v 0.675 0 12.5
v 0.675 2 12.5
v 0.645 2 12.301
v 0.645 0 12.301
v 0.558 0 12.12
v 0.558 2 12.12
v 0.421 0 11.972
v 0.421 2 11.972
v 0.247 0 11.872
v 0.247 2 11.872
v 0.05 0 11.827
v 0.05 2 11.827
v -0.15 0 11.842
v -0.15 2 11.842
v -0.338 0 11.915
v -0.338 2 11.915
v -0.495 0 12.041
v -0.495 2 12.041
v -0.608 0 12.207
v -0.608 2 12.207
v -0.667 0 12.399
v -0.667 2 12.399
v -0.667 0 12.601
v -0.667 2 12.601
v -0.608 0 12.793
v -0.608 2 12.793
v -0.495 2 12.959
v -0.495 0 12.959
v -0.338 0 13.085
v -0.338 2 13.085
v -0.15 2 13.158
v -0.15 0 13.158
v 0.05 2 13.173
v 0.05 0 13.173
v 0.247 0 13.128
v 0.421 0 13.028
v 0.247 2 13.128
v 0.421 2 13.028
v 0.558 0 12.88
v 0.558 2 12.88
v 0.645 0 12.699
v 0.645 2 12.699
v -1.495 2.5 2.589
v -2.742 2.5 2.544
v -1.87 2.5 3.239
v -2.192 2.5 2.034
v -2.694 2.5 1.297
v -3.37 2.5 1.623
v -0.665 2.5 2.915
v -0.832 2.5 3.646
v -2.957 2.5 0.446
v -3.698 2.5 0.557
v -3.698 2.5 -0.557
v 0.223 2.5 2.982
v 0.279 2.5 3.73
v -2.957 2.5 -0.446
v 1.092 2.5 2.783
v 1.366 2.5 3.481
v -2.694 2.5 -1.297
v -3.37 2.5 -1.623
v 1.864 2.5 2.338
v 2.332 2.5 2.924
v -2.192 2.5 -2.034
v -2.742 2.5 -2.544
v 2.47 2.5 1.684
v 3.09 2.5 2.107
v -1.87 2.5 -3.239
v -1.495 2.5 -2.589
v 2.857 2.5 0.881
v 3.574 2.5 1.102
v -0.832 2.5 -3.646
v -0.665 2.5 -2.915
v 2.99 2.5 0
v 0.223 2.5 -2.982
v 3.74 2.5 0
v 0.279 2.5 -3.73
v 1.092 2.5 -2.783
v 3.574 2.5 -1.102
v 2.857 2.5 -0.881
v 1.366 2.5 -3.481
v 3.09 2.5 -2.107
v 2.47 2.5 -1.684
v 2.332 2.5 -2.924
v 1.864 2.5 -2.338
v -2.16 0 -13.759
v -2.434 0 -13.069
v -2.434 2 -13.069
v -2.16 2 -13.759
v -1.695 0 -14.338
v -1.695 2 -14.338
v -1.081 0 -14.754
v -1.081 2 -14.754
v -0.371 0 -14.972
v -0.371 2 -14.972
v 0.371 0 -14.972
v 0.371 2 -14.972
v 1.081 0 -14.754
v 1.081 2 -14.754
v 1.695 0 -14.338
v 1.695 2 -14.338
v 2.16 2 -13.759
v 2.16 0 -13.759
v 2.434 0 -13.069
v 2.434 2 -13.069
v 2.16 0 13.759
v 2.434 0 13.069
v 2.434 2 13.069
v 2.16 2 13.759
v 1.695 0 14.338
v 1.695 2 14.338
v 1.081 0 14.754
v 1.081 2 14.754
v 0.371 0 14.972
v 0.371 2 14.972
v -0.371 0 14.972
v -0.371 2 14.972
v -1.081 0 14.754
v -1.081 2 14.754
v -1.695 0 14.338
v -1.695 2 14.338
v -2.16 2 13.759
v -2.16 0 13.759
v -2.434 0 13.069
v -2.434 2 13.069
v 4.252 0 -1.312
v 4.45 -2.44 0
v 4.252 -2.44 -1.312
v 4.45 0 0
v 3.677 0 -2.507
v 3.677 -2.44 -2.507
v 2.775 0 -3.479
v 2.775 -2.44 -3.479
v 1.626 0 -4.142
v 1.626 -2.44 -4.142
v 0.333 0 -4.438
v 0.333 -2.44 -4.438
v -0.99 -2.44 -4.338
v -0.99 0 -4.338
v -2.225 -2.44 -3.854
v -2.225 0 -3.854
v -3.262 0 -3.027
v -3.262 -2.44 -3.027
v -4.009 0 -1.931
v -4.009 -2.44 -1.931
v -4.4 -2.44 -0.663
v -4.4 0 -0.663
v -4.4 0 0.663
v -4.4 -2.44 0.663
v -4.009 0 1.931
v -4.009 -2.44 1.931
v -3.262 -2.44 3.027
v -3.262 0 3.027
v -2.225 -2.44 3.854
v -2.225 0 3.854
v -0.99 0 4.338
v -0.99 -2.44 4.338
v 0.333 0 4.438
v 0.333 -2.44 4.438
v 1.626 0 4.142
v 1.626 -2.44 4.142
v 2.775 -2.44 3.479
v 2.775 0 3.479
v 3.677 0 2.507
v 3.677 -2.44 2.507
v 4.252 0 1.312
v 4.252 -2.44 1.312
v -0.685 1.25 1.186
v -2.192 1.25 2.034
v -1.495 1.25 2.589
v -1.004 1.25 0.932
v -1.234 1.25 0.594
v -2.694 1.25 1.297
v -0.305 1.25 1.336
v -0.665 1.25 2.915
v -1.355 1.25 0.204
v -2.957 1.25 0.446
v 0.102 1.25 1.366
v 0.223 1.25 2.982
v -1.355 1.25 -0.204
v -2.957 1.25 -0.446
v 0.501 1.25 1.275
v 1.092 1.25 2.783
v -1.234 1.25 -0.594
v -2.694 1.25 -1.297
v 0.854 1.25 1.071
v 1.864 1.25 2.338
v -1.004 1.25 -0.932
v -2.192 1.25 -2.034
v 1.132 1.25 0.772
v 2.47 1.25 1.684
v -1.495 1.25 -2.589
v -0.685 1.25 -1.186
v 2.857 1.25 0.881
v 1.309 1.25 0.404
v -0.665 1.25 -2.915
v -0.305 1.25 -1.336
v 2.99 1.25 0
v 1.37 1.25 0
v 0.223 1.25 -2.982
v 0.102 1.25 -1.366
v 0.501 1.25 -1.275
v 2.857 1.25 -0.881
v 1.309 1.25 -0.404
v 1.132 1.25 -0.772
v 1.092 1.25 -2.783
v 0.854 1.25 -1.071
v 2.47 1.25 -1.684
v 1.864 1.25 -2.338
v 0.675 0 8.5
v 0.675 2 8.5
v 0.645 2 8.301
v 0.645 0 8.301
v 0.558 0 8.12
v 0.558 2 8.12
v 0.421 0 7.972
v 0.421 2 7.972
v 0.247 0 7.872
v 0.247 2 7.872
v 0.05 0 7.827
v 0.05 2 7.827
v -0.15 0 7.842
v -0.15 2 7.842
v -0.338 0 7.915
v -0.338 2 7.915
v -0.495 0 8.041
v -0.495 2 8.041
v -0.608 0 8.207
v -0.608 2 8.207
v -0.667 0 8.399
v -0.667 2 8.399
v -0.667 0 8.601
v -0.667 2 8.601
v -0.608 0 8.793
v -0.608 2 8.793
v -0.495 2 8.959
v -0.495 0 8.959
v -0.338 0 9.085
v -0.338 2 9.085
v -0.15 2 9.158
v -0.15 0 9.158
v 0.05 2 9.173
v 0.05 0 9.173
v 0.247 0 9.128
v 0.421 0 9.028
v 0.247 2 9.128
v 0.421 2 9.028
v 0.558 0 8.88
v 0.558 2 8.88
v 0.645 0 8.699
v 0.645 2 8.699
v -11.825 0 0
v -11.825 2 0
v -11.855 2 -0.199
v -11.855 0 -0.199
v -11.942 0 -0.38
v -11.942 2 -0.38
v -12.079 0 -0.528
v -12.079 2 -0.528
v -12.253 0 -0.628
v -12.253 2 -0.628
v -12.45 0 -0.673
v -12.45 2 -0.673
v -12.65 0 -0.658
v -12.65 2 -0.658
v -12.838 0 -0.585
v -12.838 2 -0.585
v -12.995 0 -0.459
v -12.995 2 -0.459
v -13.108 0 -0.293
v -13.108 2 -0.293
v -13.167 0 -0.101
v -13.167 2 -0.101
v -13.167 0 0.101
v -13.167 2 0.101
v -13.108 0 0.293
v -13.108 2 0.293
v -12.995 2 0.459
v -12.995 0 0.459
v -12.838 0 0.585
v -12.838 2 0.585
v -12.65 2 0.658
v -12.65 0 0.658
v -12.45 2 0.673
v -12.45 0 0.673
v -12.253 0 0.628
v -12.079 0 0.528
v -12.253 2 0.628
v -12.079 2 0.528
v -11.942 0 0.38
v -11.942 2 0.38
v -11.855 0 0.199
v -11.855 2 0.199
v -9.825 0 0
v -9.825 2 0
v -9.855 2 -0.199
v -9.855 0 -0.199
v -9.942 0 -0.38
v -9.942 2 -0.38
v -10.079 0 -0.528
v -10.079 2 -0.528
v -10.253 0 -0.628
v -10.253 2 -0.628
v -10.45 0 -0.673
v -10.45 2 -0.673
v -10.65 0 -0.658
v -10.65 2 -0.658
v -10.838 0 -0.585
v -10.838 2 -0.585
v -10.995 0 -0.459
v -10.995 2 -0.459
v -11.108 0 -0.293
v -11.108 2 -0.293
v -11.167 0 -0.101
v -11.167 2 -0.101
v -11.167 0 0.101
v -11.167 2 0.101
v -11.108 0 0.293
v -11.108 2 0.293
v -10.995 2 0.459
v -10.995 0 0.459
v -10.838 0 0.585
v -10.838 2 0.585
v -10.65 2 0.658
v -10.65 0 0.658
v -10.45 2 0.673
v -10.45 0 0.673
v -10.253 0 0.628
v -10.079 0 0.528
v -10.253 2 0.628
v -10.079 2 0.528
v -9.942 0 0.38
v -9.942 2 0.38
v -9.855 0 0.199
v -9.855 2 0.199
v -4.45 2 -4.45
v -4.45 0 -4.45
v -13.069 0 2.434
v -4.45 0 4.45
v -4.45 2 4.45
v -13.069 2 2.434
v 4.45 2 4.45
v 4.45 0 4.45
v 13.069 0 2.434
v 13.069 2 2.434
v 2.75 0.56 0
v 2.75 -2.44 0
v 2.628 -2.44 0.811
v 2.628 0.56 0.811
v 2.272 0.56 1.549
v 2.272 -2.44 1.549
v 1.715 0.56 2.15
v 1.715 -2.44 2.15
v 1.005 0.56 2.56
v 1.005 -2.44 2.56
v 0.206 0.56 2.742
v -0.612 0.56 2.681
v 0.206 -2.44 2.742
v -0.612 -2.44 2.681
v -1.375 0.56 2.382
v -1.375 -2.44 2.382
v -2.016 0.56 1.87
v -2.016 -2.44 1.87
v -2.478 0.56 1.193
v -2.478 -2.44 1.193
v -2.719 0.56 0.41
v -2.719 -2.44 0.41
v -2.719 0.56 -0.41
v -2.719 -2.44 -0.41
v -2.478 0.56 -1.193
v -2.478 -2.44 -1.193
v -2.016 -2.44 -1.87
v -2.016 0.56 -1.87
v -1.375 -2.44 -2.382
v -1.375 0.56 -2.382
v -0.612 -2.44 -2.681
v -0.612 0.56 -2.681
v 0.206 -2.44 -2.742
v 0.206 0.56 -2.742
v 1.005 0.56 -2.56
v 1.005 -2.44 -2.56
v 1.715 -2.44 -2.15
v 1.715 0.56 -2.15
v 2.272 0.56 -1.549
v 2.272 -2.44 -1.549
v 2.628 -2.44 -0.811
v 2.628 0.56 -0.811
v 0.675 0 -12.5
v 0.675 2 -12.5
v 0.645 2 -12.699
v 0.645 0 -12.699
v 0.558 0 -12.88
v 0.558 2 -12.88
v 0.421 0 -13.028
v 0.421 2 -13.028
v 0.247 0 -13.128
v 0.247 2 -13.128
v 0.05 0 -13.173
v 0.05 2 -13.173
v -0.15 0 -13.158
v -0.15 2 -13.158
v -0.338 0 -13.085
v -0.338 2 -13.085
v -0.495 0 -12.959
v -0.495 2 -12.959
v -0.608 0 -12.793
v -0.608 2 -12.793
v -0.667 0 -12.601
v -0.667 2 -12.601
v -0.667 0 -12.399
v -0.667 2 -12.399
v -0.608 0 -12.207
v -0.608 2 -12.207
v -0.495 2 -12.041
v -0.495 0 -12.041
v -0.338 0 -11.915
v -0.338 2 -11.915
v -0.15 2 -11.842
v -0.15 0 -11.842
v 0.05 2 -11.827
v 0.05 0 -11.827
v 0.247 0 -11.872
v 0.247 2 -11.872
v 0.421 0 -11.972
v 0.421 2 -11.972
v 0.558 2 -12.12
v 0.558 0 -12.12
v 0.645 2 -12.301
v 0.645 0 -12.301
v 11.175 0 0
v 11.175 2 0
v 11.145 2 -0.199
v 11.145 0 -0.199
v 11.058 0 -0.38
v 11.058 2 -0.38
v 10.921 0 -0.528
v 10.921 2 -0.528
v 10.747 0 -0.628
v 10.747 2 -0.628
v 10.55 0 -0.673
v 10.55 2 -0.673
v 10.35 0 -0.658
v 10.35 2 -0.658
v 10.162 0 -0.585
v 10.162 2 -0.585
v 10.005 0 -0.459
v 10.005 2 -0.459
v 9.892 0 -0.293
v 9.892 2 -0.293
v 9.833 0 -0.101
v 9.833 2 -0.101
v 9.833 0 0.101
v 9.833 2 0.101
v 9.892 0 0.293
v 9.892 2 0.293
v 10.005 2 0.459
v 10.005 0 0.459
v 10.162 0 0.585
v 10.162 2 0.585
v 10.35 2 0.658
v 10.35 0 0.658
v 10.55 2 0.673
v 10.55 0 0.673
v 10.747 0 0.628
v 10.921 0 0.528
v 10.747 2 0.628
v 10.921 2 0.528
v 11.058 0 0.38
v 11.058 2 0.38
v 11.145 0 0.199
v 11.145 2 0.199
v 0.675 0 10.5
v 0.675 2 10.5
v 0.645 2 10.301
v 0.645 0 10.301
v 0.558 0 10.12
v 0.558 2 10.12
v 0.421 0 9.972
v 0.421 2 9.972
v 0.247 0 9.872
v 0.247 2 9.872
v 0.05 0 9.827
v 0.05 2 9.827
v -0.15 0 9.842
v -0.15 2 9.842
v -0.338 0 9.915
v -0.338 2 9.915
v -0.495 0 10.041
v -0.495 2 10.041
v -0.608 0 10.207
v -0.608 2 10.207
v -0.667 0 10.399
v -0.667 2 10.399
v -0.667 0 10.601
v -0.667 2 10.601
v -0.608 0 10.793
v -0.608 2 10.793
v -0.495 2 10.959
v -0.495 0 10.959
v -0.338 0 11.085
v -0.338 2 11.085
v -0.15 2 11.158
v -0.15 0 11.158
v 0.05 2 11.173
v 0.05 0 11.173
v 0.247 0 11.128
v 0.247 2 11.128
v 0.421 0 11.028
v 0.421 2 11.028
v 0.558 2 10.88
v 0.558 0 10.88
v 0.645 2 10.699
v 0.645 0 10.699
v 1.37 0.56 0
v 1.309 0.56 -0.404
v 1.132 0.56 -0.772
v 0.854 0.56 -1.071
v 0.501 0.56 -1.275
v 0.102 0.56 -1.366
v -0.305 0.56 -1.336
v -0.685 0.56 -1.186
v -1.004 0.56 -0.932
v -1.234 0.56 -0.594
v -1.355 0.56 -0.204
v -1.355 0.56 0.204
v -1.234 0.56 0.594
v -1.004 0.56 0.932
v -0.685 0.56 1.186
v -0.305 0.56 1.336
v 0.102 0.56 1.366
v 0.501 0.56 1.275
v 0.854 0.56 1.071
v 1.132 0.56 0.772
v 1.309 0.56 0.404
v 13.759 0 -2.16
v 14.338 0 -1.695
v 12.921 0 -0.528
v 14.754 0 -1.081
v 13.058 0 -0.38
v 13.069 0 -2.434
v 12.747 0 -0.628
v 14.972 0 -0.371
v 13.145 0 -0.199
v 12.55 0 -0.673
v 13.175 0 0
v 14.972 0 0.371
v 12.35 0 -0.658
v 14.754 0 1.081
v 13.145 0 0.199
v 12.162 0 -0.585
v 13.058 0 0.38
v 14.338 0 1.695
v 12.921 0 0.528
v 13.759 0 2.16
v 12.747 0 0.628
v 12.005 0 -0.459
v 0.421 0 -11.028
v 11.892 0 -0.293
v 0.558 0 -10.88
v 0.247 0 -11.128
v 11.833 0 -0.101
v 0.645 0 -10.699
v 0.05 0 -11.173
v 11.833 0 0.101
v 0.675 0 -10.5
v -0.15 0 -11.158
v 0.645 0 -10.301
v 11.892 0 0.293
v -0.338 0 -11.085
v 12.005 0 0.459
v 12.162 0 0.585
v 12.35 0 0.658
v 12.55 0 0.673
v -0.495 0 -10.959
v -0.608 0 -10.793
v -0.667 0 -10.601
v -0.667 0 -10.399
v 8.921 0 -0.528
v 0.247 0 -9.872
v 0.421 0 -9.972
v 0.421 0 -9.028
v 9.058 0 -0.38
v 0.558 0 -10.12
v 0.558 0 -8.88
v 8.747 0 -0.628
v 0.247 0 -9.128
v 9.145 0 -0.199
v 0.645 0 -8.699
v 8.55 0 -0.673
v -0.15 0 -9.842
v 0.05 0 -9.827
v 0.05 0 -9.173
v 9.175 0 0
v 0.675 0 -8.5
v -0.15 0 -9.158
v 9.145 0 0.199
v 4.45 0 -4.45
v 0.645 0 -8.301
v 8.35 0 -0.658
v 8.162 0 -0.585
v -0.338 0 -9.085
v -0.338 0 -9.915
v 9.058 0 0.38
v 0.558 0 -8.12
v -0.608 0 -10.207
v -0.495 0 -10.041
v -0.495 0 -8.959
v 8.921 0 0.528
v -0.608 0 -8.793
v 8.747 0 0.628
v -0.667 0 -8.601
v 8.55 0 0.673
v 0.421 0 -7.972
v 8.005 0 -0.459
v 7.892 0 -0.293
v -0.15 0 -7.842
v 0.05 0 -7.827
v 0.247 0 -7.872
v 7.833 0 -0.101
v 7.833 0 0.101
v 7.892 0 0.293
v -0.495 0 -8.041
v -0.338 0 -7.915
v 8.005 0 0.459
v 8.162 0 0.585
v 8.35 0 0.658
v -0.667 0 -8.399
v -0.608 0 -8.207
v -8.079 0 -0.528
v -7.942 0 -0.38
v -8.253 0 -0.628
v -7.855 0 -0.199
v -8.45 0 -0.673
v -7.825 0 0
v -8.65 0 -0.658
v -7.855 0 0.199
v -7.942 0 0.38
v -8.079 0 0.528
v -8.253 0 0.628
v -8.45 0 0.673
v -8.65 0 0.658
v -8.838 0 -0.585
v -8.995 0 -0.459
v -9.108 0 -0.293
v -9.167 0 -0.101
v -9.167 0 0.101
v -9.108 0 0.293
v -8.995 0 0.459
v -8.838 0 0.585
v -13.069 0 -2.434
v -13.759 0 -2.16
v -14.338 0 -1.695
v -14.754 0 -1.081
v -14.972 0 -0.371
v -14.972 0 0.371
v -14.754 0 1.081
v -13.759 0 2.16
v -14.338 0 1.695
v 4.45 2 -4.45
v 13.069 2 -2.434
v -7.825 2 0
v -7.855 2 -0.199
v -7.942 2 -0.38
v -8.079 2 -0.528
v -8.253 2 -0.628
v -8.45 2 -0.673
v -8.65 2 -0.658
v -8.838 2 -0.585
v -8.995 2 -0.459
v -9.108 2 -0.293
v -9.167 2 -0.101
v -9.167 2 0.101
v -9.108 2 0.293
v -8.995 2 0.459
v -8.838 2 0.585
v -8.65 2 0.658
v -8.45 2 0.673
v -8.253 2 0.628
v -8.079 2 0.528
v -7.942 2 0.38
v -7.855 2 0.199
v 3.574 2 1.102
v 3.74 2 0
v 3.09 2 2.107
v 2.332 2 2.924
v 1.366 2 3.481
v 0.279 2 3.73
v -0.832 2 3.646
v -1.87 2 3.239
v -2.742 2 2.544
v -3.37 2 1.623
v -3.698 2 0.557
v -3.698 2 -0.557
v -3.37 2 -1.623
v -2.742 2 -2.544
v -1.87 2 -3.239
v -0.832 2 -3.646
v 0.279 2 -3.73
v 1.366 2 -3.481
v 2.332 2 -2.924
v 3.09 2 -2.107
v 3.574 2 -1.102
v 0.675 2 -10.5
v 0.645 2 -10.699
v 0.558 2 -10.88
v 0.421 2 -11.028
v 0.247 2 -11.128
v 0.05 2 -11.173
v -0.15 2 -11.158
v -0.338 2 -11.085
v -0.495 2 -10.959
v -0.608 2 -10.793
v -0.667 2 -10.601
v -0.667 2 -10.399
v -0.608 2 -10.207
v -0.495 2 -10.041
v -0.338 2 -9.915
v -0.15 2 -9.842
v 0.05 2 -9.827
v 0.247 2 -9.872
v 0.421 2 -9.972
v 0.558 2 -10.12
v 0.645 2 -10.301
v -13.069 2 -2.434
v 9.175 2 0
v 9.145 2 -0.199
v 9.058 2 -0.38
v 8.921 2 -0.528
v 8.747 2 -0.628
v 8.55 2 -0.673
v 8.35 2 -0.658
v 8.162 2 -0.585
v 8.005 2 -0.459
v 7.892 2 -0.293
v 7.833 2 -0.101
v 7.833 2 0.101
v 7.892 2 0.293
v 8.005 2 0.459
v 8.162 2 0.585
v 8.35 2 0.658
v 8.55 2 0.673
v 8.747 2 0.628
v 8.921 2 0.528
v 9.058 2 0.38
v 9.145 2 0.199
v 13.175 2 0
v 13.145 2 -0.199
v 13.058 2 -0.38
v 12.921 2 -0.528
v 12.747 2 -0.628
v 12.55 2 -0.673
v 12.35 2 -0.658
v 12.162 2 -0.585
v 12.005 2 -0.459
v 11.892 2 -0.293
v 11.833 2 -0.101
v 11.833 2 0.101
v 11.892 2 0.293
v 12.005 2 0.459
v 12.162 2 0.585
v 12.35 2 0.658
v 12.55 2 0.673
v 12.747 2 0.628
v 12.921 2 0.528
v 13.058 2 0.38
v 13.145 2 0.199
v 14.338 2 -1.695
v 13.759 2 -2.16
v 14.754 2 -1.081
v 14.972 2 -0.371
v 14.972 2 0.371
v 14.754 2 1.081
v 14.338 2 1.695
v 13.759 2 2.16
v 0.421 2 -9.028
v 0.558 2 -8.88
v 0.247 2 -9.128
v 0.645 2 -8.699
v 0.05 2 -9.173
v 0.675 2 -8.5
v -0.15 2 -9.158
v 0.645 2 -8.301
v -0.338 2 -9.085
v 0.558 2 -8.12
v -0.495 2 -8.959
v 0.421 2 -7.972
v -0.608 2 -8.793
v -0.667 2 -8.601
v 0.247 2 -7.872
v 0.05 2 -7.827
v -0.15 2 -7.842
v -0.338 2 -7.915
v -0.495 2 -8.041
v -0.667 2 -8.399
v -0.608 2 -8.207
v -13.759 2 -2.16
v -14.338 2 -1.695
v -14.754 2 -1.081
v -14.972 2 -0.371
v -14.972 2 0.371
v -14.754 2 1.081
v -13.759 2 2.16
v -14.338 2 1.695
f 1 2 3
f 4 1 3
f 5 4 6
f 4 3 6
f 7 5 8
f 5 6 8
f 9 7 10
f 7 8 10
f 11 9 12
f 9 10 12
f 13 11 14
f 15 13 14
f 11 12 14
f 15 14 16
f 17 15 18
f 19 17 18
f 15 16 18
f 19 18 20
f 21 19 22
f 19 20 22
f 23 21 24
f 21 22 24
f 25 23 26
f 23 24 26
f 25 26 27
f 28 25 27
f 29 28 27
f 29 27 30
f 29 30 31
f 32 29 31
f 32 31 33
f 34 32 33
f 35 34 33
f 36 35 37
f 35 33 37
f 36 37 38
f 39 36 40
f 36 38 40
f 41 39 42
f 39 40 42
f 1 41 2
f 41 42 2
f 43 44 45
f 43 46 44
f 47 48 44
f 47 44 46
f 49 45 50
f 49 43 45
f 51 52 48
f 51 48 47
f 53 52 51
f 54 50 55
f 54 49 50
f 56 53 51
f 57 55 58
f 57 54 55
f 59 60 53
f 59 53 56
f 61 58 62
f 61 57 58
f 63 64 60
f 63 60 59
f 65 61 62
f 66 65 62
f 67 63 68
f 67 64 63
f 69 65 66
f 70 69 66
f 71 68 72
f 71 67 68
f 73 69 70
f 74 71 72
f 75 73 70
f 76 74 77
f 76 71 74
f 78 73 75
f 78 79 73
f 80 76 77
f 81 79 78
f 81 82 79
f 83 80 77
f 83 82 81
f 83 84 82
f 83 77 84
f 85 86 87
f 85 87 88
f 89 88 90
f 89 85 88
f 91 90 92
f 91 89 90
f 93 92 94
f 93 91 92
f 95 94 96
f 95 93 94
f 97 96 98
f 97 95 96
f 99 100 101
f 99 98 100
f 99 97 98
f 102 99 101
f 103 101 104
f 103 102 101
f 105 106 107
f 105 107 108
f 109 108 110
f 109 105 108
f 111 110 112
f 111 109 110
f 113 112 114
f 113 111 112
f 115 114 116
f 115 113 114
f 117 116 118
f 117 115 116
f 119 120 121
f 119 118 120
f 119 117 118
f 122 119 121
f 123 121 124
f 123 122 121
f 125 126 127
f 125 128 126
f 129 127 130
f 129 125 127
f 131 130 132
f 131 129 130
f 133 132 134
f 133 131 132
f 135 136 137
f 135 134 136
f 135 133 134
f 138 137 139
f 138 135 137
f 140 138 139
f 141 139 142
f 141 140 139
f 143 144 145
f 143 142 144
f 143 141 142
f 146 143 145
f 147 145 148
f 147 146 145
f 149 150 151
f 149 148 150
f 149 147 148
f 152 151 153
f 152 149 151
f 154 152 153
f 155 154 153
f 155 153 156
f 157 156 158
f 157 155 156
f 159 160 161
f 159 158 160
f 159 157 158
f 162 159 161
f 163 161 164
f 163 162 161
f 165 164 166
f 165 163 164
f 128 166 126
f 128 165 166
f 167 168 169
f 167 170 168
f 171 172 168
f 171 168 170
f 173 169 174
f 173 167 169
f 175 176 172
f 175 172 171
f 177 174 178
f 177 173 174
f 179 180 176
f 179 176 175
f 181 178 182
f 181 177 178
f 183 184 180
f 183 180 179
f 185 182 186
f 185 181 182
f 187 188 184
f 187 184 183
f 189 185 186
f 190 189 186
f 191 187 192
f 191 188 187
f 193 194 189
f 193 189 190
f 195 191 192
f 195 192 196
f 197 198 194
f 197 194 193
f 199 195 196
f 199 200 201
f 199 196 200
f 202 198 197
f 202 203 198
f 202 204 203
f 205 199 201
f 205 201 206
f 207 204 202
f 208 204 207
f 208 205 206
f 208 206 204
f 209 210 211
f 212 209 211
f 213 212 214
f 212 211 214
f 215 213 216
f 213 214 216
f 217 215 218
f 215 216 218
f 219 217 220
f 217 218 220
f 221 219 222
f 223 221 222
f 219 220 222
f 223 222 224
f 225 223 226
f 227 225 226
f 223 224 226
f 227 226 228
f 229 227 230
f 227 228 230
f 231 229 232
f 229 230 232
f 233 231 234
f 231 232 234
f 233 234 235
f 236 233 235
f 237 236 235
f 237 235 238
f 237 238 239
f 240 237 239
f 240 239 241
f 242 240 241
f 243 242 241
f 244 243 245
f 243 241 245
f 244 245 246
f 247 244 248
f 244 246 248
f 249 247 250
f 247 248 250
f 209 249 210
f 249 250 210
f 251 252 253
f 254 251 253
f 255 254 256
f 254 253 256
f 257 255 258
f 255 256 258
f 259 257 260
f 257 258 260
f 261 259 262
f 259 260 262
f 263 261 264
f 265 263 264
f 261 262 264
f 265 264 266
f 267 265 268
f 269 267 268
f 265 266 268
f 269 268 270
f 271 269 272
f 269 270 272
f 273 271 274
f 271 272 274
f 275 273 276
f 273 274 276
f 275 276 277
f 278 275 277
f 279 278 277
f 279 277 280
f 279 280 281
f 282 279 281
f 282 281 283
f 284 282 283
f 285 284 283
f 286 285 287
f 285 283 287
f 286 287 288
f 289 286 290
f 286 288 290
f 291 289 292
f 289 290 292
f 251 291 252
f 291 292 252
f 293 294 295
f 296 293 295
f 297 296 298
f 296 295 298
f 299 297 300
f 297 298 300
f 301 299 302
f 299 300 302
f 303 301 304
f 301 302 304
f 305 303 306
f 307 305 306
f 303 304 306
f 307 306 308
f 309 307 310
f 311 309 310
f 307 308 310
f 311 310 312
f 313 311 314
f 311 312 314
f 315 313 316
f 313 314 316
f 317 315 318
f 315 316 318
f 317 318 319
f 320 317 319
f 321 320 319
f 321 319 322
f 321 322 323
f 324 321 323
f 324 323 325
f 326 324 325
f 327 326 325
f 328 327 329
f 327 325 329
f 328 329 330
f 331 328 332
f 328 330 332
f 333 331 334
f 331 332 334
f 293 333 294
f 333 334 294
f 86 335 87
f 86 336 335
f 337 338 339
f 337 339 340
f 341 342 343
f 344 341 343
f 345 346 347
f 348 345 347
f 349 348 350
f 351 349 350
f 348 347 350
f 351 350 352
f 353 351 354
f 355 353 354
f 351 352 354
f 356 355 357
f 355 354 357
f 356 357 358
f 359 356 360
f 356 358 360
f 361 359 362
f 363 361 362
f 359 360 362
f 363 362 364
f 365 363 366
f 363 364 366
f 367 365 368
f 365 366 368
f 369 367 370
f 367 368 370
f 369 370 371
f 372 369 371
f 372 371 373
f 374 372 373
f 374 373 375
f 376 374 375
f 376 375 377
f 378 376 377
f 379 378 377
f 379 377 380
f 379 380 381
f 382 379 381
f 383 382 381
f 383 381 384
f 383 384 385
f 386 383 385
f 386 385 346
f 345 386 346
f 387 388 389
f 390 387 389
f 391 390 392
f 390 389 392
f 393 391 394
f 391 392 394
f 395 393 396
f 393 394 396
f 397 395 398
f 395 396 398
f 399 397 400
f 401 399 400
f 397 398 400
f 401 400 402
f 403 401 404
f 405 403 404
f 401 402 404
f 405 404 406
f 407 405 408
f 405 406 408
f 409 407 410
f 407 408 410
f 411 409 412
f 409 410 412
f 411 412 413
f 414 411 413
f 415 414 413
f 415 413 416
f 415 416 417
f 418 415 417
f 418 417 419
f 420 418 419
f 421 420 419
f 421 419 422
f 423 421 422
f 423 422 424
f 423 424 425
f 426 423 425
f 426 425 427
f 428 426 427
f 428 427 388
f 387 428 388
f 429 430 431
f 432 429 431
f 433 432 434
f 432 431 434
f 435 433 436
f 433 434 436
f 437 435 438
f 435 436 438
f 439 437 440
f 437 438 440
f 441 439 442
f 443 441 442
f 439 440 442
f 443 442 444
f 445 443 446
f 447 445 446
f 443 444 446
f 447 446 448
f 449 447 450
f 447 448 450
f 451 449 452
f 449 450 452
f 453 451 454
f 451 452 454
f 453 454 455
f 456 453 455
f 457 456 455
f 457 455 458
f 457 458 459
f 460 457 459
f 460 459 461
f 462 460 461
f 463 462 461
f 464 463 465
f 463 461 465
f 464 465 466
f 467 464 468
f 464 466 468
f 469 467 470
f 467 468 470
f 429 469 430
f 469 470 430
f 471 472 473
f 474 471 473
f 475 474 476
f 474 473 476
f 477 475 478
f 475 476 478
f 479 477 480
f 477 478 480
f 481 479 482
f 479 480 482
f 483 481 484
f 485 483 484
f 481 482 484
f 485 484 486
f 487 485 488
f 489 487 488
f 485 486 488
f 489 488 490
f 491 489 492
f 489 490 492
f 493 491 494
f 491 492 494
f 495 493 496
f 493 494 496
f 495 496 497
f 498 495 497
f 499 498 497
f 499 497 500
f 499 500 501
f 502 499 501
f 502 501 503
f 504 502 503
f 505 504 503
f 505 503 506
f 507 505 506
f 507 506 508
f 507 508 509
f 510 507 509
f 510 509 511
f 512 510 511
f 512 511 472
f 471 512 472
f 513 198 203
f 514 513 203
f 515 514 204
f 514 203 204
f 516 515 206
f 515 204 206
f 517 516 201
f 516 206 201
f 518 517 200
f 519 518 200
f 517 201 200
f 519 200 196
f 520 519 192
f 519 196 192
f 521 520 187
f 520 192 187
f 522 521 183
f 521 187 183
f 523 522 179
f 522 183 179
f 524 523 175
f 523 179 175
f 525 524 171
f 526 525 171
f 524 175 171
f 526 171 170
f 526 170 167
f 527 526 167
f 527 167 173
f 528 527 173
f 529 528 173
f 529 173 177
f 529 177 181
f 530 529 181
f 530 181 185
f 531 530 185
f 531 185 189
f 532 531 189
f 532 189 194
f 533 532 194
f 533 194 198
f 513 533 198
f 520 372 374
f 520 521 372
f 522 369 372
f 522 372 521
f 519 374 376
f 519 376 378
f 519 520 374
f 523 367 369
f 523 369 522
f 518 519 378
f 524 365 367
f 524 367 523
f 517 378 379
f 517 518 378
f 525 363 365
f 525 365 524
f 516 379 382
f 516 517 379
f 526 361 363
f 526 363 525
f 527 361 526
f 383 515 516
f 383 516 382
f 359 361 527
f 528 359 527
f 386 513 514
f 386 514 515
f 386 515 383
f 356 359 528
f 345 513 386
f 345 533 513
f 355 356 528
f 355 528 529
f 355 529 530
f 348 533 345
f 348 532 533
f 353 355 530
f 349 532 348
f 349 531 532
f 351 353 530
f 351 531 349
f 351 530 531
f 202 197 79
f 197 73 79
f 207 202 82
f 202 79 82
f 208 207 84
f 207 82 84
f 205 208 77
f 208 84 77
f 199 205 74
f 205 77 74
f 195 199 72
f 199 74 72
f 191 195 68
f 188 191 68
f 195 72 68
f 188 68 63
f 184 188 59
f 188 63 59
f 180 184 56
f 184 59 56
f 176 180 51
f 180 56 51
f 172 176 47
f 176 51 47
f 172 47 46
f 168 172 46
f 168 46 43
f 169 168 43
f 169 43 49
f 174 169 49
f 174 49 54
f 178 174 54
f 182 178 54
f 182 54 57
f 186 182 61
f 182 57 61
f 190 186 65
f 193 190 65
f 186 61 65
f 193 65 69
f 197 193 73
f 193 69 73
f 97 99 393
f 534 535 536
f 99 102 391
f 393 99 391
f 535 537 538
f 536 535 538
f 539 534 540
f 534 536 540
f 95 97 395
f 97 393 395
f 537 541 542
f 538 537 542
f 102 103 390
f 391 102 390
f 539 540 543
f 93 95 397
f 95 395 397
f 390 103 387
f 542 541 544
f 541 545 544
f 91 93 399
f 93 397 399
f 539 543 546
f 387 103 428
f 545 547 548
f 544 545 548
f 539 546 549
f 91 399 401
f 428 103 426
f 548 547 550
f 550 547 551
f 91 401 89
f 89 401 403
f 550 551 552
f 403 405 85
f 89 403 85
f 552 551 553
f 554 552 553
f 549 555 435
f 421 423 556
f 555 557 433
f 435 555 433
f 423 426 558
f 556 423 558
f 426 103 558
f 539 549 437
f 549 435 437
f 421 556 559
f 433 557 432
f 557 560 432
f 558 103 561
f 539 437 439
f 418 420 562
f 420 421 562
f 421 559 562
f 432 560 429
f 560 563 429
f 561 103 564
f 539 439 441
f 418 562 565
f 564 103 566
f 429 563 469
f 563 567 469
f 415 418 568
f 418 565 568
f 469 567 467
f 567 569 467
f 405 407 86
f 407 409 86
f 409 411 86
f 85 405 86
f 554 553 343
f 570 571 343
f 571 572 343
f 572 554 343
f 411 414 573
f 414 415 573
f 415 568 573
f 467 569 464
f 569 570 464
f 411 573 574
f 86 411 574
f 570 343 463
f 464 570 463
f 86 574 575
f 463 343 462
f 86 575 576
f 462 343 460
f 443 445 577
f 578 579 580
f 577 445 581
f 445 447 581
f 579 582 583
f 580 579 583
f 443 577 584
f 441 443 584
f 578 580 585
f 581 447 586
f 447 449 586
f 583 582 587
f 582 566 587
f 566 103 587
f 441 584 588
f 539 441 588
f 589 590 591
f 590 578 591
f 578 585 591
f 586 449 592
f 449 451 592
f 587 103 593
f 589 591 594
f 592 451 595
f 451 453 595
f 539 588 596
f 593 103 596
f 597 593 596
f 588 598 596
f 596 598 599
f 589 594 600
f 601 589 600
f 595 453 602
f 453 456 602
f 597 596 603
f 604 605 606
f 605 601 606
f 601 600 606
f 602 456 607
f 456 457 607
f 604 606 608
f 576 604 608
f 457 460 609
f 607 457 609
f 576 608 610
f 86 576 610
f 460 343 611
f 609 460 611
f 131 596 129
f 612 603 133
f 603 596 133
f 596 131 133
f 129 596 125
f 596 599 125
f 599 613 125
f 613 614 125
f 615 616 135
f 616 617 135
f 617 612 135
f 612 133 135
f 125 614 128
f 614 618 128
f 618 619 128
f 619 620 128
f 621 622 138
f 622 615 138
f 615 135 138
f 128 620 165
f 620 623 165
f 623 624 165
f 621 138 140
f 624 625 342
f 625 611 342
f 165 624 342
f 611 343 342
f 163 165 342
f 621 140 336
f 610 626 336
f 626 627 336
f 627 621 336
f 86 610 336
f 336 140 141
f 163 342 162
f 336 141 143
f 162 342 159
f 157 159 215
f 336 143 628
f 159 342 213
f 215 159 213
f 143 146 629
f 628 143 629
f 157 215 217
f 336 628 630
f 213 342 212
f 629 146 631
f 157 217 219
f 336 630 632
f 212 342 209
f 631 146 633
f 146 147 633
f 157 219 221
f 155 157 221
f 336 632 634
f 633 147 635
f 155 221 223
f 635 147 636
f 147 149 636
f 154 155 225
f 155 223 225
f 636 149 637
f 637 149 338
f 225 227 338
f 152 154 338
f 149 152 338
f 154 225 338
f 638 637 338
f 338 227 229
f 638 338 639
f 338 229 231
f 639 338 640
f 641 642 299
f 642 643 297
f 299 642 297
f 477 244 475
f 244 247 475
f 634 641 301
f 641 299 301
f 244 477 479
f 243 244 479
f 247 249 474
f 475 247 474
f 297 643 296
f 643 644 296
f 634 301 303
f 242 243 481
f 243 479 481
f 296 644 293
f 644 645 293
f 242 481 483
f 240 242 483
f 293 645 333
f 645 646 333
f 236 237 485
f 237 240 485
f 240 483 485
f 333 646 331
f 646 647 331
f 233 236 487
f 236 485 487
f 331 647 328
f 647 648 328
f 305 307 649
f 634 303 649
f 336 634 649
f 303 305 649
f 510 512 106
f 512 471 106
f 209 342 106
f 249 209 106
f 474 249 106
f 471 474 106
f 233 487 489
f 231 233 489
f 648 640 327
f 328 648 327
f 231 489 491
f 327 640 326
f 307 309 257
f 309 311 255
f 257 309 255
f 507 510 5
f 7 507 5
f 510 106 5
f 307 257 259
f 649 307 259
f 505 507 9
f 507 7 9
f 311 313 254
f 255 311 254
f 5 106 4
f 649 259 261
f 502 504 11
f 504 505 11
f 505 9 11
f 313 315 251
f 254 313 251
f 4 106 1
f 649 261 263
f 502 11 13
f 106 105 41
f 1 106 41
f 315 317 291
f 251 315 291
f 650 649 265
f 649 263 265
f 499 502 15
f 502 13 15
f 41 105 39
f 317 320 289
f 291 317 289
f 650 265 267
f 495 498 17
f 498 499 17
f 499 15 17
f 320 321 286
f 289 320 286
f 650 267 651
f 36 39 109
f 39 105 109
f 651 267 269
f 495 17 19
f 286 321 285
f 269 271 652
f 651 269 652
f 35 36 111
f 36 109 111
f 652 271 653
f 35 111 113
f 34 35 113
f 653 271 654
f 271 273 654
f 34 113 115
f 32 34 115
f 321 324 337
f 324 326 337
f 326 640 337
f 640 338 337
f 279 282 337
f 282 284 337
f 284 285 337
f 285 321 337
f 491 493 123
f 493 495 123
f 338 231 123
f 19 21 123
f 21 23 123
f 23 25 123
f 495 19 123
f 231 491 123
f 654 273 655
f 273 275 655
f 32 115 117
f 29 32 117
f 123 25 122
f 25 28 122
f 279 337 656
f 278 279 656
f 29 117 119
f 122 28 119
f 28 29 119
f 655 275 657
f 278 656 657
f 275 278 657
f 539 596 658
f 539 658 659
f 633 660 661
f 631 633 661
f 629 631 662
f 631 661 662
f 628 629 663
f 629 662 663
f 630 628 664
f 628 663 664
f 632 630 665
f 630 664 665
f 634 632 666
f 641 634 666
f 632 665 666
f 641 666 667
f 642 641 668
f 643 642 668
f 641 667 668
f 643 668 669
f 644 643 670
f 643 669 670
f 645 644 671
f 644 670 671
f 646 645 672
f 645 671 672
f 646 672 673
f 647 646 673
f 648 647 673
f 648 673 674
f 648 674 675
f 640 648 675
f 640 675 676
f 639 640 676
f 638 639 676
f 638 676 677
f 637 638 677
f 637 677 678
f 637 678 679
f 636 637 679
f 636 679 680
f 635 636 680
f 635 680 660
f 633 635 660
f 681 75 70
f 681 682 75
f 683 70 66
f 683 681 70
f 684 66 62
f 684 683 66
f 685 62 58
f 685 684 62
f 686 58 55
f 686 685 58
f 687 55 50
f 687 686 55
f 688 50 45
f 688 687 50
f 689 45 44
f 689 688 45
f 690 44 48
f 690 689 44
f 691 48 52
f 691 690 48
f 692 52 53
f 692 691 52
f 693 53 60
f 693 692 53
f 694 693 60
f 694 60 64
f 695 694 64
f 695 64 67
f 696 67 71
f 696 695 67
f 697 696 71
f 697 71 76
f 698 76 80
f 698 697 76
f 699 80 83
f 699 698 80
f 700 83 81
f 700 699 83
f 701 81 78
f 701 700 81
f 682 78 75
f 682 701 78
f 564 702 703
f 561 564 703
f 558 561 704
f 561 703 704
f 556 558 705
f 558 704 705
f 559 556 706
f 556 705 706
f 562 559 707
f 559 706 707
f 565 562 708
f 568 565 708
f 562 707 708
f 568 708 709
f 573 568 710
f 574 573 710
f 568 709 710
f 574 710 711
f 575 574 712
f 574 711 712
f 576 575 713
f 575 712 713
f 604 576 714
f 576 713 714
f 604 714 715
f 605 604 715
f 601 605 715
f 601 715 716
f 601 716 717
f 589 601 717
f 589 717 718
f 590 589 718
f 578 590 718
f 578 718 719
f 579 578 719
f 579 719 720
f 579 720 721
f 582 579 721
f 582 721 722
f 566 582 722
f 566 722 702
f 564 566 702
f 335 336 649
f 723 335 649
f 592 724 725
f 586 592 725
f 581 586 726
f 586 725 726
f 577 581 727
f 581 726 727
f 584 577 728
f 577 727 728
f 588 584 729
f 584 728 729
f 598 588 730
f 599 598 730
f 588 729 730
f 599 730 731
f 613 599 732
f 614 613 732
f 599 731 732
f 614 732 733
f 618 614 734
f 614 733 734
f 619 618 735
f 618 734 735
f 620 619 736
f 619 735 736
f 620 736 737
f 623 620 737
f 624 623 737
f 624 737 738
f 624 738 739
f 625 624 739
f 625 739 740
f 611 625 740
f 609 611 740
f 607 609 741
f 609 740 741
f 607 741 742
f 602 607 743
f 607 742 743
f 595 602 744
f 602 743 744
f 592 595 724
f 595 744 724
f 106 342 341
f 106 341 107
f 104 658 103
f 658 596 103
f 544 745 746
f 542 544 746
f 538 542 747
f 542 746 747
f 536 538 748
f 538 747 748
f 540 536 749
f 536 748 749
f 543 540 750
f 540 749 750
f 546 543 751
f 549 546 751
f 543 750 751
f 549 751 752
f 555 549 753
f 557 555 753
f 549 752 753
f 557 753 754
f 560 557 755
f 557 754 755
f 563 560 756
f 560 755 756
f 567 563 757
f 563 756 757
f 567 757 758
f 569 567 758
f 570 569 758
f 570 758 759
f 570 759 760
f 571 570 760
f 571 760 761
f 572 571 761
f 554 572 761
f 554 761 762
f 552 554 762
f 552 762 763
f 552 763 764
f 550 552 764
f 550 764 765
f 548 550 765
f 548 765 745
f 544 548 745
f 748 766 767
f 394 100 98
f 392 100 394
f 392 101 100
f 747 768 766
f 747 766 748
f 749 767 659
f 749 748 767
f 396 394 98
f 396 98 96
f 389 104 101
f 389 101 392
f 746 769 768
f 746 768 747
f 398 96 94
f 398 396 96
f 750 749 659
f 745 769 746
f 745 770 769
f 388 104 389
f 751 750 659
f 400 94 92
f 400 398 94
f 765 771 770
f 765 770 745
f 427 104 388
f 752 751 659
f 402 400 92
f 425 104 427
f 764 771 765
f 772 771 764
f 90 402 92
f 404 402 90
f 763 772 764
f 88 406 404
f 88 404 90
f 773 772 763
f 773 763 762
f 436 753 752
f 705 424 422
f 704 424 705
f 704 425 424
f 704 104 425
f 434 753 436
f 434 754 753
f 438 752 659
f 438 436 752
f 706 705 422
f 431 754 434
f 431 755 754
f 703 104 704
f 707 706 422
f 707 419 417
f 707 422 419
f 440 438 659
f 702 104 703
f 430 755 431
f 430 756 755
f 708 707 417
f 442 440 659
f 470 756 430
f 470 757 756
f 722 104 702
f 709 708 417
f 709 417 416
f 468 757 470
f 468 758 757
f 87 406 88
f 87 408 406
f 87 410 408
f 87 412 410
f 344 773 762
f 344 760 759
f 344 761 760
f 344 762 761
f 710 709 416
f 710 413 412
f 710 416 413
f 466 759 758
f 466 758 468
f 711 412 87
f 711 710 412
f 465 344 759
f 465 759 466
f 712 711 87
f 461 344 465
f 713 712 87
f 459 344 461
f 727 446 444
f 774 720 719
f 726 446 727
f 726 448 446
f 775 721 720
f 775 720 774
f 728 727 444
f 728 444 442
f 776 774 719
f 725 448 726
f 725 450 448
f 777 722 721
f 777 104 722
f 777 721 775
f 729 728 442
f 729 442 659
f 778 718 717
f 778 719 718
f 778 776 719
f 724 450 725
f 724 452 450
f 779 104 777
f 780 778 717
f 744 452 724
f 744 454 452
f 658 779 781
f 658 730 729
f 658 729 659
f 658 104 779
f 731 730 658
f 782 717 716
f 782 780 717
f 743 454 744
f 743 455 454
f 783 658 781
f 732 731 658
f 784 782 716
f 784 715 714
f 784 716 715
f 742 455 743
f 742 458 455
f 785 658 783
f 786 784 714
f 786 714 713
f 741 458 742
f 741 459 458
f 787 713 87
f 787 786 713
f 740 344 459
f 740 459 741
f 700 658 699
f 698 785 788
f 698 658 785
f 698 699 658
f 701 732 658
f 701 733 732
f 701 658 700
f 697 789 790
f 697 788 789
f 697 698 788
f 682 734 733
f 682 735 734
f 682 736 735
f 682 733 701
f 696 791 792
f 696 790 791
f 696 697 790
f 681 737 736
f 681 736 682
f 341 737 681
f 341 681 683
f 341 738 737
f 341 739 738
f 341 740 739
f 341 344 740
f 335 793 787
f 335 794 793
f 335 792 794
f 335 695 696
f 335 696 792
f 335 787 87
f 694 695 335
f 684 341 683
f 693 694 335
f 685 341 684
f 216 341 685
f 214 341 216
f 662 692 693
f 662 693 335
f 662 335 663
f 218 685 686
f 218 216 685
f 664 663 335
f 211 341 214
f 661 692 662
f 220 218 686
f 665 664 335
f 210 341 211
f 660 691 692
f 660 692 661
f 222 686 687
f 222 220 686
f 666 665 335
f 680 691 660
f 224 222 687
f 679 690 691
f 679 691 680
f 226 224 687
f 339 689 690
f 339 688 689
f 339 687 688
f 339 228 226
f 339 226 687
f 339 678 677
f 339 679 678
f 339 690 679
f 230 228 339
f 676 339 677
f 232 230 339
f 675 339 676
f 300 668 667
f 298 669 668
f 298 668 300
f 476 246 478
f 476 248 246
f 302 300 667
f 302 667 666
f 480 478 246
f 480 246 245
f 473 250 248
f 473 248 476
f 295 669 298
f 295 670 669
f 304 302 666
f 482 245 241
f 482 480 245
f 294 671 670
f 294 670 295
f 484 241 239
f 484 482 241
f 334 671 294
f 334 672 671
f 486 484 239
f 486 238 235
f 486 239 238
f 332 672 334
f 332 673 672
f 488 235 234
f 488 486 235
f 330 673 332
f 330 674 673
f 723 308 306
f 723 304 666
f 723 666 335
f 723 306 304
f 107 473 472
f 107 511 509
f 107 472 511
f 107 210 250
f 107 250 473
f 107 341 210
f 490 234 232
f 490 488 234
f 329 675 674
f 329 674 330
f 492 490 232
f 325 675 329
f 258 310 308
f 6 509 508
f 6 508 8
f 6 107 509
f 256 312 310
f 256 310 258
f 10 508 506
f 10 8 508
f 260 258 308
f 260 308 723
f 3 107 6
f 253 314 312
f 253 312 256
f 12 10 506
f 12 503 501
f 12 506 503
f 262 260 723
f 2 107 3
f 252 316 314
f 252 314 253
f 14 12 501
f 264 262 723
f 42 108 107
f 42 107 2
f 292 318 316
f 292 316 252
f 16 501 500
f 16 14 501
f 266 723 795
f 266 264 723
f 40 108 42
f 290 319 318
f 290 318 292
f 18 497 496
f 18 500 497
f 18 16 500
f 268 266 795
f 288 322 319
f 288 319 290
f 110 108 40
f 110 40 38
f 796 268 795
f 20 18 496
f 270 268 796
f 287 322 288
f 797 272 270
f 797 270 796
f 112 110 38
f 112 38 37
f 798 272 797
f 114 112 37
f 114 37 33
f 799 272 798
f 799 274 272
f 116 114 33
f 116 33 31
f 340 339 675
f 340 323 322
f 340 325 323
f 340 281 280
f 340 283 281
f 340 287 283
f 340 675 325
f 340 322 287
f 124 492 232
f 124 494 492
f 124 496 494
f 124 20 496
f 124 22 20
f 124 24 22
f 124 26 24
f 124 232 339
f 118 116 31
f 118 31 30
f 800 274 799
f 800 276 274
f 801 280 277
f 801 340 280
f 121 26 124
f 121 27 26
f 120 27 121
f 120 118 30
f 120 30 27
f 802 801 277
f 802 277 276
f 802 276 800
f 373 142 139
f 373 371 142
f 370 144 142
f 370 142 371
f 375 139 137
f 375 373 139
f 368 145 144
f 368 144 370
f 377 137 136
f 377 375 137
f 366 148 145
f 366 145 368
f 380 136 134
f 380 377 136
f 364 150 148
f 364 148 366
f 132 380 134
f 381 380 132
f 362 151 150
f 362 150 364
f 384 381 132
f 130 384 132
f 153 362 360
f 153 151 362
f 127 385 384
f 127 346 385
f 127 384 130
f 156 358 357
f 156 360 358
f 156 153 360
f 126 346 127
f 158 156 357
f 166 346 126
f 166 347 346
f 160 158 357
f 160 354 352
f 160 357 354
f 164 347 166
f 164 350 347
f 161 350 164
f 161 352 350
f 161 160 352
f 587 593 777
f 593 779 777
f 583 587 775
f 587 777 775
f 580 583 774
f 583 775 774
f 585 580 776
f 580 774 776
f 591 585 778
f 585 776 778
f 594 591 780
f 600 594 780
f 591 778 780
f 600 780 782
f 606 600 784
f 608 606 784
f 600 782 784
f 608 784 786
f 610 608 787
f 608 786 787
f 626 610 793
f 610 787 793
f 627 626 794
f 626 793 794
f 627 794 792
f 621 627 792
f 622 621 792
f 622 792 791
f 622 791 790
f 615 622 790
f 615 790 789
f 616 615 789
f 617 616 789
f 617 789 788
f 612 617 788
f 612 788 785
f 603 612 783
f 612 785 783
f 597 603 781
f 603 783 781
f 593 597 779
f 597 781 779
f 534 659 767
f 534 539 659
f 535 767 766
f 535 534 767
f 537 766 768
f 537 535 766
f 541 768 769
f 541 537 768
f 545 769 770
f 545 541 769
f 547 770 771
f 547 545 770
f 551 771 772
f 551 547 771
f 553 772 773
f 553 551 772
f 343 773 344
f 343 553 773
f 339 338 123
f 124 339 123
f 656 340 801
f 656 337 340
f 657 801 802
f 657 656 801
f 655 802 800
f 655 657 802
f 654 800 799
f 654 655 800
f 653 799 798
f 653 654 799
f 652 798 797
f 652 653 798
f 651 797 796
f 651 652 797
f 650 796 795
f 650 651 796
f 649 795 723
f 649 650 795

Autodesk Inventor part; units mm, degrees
ref_plane "YZ Plane" through (0, 0, 0) normal (1, 0, 0) x (0, 1, 0)
ref_plane "XZ Plane" through (0, 0, 0) normal (0, 1, 0) x (-1, 0, 0)
ref_plane "XY Plane" through (0, 0, 0) normal (0, 0, 1) x (1, 0, 0)
sketch "Sketch1" plane through (0, 0, 0) normal (0, 1, 0) x (-1, 0, 0)
  circle A0 centre (0, 0) radius 4.45
  circle A1 centre (12.5, 0) radius 2.5
  circle A2 centre (0, -12.5) radius 2.5
  line L0 (4.45, -4.45) -> (13.0693, -2.4343)
  line L1 (4.45, -4.45) -> (2.4343, -13.0693)
  circle A3 centre (12.5, 0) radius 2.5
  circle A4 centre (0, 12.5) radius 2.5
  line L2 (4.45, 4.45) -> (13.0693, 2.4343)
  line L3 (4.45, 4.45) -> (2.4343, 13.0693)
  circle A5 centre (-12.5, 0) radius 2.5
  line L4 (-4.45, -4.45) -> (-13.0693, -2.4343)
  line L5 (-4.45, -4.45) -> (-2.4343, -13.0693)
  line L6 (-4.45, 4.45) -> (-13.0693, 2.4343)
  line L7 (-4.45, 4.45) -> (-2.4343, 13.0693)
  dimension "d2" = 5
  dimension "d0" = 8.9
extrude "Extrusion1" add sketch "Sketch1" along normal blind 2 contours A0 | A1 | A1 L0 L1 A2 L5 L4 A5 L6 L7 A4 L3 L2 | A4 | A2 | A5
sketch "Sketch2" plane through (0, 2, 0) normal (0, 1, 0) x (1, 0, 0)
  circle A0 centre (0, 0) radius 3.74
  dimension "d8" = 7.48
extrude "Extrusion2" add sketch "Sketch2" along normal blind 0.5
sketch "Sketch3" plane through (0, 2.5, 0) normal (0, 1, 0) x (1, 0, 0)
  circle A0 centre (0, 0) radius 2.99
  dimension "d11" = 5.98
extrude "Extrusion3" cut sketch "Sketch3" against normal blind 1.25
sketch "Sketch4" plane through (0, 1.25, 0) normal (0, 1, 0) x (1, 0, 0)
  circle A0 centre (0, 0) radius 1.37
  dimension "d14" = 2.74
extrude "Extrusion4" cut sketch "Sketch4" against normal blind 0.69
sketch "Sketch5" plane through (0, 0, 0) normal (0, -1, 0) x (1, 0, 0)
  circle A0 centre (0, 0) radius 4.45
  dimension "d17" = 8.9
extrude "Extrusion5" add sketch "Sketch5" along normal blind 2.44
sketch "Sketch6" plane through (0, -2.44, 0) normal (0, -1, 0) x (1, 0, 0)
  circle A0 centre (0, 0) radius 2.75
  dimension "d20" = 5.5
extrude "Extrusion6" cut sketch "Sketch6" against normal blind 3
sketch "Sketch7" plane through (0, 2, 0) normal (0, 1, 0) x (1, 0, 0)
  circle A0 centre (0, 8.5) radius 0.675
  circle A1 centre (0, 10.5) radius 0.675
  arc A2 (2.4343, 13.0693) -> (-2.4343, 13.0693) centre (0, 12.5) ccw projected
  circle A3 centre (0, 12.5) radius 0.675
  arc A4 (-13.0693, 2.4343) -> (-13.0693, -2.4343) centre (-12.5, 0) ccw projected
  arc A5 (13.0693, -2.4343) -> (13.0693, 2.4343) centre (12.5, 0) ccw projected
  circle A6 centre (0, -8.5) radius 0.675
  circle A7 centre (0, -10.5) radius 0.675
  circle A8 centre (0, -12.5) radius 0.675
  circle A9 centre (0, 0) radius 3.74 projected
  circle A10 centre (8.5, 0) radius 0.675
  circle A11 centre (0, 0) radius 1.37 projected
  circle A12 centre (10.5, 0) radius 0.675
  circle A13 centre (12.5, 0) radius 0.675
  arc A14 (-2.4343, -13.0693) -> (2.4343, -13.0693) centre (0, -12.5) ccw projected
  circle A15 centre (-8.5, 0) radius 0.675
  circle A16 centre (-10.5, 0) radius 0.675
  circle A17 centre (-12.5, 0) radius 0.675
  dimension "d24" = 1.35
  dimension "d26" = 1.35
  dimension "d28" = 1.35
  dimension "d30" = 1.35
  dimension "d32" = 1.35
  dimension "d34" = 1.35
extrude "Extrusion7" cut sketch "Sketch7" against normal blind 2 contours A0 | A1 | A3 | A6 | A7 | A8 | A10 | A12 | A13 | A15 | A16 | A17
properties part number "MMAE 232 Assignment 2_Servo Horn 5 - Dylan Tamras"
